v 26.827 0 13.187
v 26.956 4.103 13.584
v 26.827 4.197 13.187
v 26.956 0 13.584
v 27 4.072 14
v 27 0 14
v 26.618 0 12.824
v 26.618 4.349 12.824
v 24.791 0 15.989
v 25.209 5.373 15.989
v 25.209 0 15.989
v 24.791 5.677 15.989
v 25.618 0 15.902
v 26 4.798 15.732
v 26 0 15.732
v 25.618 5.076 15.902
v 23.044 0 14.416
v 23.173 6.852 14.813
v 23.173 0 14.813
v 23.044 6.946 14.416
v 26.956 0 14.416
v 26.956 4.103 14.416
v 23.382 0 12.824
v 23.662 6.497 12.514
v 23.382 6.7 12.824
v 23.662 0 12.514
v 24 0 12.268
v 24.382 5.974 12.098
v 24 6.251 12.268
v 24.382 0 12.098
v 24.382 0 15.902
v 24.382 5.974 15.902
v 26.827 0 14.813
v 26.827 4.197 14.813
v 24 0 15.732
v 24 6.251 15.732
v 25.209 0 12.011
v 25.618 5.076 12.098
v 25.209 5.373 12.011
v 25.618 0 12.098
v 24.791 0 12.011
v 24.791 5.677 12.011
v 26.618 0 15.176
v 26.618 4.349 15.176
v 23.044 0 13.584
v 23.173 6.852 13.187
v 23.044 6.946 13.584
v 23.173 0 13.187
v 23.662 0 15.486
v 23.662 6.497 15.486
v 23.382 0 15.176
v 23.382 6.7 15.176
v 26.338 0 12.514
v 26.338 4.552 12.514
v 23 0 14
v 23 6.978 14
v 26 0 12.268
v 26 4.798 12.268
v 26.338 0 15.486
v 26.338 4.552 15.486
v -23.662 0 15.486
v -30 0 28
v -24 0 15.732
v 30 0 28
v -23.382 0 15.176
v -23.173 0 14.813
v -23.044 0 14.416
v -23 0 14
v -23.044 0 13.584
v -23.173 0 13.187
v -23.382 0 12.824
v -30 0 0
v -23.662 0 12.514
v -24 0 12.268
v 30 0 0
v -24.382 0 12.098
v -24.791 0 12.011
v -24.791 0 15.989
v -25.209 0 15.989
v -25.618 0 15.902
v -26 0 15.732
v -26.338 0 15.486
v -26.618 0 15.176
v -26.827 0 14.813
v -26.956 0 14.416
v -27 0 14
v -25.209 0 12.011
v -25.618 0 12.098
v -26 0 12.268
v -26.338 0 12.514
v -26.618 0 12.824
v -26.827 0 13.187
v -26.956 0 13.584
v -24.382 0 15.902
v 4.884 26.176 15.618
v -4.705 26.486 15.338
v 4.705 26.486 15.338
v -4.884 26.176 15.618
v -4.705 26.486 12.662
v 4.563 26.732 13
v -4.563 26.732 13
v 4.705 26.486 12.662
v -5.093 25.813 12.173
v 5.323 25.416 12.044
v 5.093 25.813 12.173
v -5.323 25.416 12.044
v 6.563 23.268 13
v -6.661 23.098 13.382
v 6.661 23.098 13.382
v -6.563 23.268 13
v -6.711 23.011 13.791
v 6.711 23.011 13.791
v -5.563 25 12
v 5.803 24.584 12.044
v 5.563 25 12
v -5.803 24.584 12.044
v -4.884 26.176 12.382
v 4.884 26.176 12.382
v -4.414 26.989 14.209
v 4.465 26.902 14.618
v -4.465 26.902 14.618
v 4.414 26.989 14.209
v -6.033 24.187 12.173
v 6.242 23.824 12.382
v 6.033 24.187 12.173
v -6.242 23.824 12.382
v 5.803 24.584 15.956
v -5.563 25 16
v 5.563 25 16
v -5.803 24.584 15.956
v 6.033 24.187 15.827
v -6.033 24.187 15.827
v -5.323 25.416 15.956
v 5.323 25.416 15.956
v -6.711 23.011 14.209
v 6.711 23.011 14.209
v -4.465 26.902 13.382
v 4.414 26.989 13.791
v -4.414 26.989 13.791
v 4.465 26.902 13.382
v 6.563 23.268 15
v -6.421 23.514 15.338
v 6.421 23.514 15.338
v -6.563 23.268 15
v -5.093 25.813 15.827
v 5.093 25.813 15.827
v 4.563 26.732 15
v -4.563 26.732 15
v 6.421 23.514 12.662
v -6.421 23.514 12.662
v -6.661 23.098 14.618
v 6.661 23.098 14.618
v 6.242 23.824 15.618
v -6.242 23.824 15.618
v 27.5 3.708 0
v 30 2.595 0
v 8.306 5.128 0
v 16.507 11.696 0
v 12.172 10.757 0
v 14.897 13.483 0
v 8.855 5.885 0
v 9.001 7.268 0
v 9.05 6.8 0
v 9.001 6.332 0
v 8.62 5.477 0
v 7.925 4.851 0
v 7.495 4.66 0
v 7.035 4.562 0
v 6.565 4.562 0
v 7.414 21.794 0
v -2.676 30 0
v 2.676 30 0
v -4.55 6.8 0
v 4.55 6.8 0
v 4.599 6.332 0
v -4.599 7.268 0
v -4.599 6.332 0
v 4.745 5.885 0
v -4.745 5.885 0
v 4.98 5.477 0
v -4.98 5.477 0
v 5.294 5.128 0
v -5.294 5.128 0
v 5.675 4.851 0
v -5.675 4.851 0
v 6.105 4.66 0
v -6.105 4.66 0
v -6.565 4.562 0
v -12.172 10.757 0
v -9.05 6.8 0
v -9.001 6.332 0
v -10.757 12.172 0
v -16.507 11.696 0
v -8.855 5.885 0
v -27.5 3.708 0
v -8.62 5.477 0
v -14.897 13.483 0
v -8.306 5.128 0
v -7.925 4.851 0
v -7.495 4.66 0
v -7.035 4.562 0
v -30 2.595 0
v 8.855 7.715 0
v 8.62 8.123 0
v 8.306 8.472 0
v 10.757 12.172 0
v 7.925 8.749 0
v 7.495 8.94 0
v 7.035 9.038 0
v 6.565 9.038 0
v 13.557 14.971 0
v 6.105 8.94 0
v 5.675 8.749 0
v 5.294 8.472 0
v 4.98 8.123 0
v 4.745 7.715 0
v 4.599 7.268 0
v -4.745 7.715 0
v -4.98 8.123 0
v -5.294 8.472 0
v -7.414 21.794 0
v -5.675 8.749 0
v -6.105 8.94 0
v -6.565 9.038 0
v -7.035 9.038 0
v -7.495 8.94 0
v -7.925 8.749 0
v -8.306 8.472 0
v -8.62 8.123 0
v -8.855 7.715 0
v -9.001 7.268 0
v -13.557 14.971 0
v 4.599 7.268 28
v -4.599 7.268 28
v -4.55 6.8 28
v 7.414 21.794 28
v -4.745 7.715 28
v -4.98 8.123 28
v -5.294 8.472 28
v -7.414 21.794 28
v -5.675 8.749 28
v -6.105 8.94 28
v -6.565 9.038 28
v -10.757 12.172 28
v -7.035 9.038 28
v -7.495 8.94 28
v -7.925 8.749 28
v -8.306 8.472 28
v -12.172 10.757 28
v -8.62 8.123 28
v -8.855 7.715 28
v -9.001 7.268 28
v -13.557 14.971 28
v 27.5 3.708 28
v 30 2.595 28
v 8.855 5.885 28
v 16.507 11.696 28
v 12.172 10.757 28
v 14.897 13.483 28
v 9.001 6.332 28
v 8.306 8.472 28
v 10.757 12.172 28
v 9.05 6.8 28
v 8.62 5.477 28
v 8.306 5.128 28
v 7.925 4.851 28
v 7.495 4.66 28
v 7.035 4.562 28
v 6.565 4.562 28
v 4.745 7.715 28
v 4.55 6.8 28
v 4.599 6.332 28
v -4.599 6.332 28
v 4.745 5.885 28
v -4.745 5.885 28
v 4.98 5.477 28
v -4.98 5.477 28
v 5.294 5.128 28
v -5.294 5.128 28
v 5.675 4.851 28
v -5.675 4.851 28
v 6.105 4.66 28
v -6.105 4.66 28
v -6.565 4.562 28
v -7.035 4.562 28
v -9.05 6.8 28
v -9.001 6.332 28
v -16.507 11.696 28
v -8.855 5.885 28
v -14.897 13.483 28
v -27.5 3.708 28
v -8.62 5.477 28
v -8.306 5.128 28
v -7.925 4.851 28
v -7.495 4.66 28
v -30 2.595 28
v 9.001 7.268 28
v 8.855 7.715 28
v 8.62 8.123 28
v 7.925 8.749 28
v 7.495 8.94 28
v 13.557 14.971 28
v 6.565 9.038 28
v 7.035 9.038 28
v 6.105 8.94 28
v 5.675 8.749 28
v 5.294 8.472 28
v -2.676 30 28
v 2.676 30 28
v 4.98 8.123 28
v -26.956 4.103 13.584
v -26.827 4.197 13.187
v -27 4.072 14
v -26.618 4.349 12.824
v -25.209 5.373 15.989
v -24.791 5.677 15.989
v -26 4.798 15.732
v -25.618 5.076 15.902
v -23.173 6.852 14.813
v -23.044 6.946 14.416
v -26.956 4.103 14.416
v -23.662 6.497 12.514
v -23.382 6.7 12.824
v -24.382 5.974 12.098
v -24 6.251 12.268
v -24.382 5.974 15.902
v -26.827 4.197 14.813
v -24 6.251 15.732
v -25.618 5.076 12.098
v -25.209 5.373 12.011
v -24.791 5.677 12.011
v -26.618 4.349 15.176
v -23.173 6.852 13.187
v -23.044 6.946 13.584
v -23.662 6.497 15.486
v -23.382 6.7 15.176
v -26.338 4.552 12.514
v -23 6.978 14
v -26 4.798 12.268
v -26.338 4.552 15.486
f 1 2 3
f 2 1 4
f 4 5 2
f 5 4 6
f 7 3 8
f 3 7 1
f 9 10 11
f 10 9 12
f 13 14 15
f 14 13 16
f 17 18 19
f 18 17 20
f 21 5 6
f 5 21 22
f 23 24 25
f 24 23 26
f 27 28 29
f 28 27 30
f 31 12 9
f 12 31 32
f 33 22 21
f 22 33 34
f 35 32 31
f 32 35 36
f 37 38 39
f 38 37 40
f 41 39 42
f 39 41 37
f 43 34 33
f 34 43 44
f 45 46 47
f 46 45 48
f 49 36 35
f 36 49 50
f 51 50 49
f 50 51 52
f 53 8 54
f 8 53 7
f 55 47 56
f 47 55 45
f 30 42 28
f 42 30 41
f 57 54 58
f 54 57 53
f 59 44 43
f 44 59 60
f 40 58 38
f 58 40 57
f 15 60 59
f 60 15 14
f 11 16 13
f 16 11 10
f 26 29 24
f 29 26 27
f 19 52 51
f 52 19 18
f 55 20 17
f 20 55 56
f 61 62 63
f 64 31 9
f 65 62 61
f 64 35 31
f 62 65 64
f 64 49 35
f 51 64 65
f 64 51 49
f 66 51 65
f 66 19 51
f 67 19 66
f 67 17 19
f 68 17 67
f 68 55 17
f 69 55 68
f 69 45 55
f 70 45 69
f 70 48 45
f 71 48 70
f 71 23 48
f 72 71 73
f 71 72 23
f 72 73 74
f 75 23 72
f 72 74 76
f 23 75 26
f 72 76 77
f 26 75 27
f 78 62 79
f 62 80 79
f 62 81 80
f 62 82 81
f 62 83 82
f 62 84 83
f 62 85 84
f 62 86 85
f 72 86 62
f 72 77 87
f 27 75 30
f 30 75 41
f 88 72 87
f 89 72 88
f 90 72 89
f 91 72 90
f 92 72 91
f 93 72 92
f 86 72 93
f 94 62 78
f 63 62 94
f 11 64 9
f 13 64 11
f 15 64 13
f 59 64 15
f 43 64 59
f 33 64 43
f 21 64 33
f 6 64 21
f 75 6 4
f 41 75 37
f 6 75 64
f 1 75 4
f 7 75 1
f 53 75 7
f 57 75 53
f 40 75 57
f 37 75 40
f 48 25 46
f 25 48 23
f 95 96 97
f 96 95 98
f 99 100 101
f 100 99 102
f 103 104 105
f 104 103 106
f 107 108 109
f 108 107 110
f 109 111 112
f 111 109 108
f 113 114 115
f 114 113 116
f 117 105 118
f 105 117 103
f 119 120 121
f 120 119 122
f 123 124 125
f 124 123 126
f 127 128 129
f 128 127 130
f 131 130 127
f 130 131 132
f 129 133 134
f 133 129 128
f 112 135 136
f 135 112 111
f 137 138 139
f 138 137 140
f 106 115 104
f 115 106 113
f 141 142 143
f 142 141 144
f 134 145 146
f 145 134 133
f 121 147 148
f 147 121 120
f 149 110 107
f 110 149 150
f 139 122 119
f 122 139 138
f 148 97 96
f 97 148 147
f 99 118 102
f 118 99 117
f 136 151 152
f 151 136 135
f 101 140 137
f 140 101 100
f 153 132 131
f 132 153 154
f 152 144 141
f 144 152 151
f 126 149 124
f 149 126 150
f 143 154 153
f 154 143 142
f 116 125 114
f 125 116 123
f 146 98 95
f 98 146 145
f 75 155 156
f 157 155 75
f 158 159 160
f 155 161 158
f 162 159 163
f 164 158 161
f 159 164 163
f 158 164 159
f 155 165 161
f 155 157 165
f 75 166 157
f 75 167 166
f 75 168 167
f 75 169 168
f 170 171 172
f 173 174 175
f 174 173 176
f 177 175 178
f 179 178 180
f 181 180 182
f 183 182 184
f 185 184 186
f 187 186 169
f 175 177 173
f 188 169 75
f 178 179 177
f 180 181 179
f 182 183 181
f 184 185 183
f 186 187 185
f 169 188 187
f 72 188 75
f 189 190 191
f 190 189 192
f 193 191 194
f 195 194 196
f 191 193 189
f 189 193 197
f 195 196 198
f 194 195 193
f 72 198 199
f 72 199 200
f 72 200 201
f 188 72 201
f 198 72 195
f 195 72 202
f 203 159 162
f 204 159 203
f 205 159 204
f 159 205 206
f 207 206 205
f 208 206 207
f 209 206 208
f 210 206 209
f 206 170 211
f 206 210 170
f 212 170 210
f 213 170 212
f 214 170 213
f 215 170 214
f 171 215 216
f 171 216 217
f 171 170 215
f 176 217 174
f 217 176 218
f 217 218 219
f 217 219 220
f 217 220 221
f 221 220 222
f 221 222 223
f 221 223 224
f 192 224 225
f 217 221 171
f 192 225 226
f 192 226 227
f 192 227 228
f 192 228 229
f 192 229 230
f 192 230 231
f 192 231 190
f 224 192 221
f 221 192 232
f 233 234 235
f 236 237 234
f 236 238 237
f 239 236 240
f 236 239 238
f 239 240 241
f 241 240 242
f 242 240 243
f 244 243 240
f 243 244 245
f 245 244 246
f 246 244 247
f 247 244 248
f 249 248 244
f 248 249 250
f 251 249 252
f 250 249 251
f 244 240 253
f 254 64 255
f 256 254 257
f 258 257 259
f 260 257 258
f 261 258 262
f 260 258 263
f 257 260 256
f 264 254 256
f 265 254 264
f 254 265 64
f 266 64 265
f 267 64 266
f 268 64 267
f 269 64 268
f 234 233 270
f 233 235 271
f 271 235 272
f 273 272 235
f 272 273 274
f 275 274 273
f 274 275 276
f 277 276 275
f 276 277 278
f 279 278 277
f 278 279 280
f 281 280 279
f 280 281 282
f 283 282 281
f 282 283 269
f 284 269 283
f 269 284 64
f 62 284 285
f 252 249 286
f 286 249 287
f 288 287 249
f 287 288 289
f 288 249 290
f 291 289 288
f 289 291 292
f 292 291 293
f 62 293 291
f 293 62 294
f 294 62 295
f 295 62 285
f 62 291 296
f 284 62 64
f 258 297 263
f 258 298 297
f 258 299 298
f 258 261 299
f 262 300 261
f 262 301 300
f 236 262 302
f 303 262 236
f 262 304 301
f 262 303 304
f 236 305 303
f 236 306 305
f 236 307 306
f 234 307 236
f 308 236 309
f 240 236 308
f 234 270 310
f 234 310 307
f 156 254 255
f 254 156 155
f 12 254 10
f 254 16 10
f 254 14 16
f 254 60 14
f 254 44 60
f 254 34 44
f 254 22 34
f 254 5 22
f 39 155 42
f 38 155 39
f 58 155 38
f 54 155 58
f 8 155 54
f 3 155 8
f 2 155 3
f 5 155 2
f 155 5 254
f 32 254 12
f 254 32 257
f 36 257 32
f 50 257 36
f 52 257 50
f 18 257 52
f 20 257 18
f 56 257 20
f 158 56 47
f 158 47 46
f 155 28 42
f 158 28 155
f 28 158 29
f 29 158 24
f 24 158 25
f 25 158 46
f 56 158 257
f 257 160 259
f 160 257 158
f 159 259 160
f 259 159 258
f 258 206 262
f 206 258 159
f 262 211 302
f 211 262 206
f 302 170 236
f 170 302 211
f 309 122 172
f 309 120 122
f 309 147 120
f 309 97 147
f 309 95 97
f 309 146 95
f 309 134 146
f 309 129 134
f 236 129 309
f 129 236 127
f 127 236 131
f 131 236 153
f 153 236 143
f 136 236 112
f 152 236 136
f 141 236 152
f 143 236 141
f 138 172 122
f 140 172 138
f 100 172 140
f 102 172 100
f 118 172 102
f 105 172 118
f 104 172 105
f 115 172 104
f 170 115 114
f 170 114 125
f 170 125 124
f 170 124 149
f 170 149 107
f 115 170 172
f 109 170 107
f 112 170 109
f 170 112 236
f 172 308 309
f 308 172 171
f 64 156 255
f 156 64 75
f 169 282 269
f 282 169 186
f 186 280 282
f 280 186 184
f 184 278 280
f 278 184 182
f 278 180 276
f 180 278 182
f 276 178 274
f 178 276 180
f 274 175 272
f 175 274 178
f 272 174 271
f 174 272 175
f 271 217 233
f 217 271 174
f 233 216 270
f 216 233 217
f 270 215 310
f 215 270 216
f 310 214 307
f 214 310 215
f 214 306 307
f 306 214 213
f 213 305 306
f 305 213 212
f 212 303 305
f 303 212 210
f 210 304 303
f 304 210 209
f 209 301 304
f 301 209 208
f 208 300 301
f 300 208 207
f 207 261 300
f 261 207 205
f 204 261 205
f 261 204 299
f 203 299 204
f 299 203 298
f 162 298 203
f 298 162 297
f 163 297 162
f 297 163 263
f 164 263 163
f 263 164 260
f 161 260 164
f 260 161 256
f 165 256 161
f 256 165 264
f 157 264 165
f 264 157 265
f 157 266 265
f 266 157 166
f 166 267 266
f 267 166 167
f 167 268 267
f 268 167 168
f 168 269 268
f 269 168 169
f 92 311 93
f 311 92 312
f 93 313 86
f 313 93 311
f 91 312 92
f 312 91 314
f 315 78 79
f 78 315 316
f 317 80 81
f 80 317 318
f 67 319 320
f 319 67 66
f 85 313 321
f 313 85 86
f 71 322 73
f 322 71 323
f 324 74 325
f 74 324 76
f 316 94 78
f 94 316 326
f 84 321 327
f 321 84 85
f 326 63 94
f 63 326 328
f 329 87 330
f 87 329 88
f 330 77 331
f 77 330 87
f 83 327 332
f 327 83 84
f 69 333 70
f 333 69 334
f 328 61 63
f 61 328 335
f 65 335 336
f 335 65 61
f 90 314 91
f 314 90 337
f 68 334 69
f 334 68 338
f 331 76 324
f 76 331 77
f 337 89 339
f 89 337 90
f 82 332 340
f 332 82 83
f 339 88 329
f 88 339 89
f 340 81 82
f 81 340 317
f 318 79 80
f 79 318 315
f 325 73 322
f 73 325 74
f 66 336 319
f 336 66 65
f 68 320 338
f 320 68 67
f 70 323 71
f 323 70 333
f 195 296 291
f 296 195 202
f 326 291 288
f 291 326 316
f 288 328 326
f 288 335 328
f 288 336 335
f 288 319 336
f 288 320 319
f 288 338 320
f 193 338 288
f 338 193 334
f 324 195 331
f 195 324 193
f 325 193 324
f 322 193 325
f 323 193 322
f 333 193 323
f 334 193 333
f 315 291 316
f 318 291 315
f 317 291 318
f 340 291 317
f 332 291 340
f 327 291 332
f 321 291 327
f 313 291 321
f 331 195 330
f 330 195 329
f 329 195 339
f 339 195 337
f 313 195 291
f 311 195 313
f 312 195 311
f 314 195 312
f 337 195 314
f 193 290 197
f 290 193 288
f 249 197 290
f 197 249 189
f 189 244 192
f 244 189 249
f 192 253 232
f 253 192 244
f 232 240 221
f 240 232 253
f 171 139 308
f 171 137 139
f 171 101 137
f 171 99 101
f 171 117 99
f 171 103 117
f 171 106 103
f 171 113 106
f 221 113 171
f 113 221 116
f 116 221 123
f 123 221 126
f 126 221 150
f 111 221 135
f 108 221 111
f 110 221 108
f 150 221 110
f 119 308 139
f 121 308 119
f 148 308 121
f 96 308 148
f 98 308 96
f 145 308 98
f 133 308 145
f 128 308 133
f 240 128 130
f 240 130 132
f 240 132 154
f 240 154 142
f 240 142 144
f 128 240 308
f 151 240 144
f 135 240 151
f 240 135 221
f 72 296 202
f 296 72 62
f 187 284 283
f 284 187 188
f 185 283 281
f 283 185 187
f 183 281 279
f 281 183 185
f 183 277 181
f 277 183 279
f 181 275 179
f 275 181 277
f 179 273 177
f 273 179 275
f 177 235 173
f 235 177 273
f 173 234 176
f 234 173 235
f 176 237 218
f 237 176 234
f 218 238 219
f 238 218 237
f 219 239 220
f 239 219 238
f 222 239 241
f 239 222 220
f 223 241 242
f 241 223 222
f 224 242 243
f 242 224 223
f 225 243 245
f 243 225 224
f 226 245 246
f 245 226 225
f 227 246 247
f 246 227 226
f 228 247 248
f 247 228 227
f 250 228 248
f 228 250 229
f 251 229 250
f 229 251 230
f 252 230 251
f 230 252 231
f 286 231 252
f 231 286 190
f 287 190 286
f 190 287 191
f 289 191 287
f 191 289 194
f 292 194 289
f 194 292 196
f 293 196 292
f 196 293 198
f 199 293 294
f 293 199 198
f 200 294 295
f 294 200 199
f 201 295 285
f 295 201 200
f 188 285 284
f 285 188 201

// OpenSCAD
// this is the diameter of the outside of the fan casing for calculating
// the curvature in the bracket. Approximation is sufficent.
outer_fan_diameter=130;
// the inner spacing of the fan, i.e., where the bracket goes. So, height of
// the bracket.
inner_height=28;
// generate extra screw holes. Those can be used for screwing the fan stack
// into something as well as screwing something into the side of the fan stack.
// Disabling this might speed up prints a little bit.
screw_holes=true;
// number of fans to connect together. 1 just
mount_points=2;
// diameter of the fan screws. This should work with pretty much any fan srews.
fan_screw_diameter=4.5;
// diameter of the mounting holes. Enlarge to 4.5 if you want to use fan screws.
screw_diameter=4;

$fn=30;


module copy_mirror(vec=[0,1,0])
{
    children();
    mirror(vec) children();
}

module fan_bracket(){
  difference(){
    linear_extrude(inner_height){
      difference(){
        square(size=[30,30], center = false);
        translate([6.8, 6.8]){
          circle(d=fan_screw_diameter);
        }
        translate([60, 60]){
          circle(d=outer_fan_diameter);
        }
        translate([15, 15]){
          rotate([0, 0, -45]){
            square(size=[2, 10], center=true);
          }
        }
      }
    }
    if (screw_holes==true){
      translate([0,0,inner_height/2]){
        translate([25,0,0]){
          rotate([-90,0,0]){
            cylinder(h=10, d=screw_diameter);
          }
        }
        translate([0,25,0]){
          rotate([0,90,0]){
            cylinder(h=10, d=screw_diameter);
          }
        }
      }
    }
  }
}

fan_bracket();
if (mount_points>=2){
  copy_mirror([1, 0, 0]){fan_bracket();}
}
if (mount_points>=3){
  copy_mirror([1, 1, 0]){fan_bracket();}
}
if (mount_points>=4){
  copy_mirror([0, 1, 0]){fan_bracket();}
}
